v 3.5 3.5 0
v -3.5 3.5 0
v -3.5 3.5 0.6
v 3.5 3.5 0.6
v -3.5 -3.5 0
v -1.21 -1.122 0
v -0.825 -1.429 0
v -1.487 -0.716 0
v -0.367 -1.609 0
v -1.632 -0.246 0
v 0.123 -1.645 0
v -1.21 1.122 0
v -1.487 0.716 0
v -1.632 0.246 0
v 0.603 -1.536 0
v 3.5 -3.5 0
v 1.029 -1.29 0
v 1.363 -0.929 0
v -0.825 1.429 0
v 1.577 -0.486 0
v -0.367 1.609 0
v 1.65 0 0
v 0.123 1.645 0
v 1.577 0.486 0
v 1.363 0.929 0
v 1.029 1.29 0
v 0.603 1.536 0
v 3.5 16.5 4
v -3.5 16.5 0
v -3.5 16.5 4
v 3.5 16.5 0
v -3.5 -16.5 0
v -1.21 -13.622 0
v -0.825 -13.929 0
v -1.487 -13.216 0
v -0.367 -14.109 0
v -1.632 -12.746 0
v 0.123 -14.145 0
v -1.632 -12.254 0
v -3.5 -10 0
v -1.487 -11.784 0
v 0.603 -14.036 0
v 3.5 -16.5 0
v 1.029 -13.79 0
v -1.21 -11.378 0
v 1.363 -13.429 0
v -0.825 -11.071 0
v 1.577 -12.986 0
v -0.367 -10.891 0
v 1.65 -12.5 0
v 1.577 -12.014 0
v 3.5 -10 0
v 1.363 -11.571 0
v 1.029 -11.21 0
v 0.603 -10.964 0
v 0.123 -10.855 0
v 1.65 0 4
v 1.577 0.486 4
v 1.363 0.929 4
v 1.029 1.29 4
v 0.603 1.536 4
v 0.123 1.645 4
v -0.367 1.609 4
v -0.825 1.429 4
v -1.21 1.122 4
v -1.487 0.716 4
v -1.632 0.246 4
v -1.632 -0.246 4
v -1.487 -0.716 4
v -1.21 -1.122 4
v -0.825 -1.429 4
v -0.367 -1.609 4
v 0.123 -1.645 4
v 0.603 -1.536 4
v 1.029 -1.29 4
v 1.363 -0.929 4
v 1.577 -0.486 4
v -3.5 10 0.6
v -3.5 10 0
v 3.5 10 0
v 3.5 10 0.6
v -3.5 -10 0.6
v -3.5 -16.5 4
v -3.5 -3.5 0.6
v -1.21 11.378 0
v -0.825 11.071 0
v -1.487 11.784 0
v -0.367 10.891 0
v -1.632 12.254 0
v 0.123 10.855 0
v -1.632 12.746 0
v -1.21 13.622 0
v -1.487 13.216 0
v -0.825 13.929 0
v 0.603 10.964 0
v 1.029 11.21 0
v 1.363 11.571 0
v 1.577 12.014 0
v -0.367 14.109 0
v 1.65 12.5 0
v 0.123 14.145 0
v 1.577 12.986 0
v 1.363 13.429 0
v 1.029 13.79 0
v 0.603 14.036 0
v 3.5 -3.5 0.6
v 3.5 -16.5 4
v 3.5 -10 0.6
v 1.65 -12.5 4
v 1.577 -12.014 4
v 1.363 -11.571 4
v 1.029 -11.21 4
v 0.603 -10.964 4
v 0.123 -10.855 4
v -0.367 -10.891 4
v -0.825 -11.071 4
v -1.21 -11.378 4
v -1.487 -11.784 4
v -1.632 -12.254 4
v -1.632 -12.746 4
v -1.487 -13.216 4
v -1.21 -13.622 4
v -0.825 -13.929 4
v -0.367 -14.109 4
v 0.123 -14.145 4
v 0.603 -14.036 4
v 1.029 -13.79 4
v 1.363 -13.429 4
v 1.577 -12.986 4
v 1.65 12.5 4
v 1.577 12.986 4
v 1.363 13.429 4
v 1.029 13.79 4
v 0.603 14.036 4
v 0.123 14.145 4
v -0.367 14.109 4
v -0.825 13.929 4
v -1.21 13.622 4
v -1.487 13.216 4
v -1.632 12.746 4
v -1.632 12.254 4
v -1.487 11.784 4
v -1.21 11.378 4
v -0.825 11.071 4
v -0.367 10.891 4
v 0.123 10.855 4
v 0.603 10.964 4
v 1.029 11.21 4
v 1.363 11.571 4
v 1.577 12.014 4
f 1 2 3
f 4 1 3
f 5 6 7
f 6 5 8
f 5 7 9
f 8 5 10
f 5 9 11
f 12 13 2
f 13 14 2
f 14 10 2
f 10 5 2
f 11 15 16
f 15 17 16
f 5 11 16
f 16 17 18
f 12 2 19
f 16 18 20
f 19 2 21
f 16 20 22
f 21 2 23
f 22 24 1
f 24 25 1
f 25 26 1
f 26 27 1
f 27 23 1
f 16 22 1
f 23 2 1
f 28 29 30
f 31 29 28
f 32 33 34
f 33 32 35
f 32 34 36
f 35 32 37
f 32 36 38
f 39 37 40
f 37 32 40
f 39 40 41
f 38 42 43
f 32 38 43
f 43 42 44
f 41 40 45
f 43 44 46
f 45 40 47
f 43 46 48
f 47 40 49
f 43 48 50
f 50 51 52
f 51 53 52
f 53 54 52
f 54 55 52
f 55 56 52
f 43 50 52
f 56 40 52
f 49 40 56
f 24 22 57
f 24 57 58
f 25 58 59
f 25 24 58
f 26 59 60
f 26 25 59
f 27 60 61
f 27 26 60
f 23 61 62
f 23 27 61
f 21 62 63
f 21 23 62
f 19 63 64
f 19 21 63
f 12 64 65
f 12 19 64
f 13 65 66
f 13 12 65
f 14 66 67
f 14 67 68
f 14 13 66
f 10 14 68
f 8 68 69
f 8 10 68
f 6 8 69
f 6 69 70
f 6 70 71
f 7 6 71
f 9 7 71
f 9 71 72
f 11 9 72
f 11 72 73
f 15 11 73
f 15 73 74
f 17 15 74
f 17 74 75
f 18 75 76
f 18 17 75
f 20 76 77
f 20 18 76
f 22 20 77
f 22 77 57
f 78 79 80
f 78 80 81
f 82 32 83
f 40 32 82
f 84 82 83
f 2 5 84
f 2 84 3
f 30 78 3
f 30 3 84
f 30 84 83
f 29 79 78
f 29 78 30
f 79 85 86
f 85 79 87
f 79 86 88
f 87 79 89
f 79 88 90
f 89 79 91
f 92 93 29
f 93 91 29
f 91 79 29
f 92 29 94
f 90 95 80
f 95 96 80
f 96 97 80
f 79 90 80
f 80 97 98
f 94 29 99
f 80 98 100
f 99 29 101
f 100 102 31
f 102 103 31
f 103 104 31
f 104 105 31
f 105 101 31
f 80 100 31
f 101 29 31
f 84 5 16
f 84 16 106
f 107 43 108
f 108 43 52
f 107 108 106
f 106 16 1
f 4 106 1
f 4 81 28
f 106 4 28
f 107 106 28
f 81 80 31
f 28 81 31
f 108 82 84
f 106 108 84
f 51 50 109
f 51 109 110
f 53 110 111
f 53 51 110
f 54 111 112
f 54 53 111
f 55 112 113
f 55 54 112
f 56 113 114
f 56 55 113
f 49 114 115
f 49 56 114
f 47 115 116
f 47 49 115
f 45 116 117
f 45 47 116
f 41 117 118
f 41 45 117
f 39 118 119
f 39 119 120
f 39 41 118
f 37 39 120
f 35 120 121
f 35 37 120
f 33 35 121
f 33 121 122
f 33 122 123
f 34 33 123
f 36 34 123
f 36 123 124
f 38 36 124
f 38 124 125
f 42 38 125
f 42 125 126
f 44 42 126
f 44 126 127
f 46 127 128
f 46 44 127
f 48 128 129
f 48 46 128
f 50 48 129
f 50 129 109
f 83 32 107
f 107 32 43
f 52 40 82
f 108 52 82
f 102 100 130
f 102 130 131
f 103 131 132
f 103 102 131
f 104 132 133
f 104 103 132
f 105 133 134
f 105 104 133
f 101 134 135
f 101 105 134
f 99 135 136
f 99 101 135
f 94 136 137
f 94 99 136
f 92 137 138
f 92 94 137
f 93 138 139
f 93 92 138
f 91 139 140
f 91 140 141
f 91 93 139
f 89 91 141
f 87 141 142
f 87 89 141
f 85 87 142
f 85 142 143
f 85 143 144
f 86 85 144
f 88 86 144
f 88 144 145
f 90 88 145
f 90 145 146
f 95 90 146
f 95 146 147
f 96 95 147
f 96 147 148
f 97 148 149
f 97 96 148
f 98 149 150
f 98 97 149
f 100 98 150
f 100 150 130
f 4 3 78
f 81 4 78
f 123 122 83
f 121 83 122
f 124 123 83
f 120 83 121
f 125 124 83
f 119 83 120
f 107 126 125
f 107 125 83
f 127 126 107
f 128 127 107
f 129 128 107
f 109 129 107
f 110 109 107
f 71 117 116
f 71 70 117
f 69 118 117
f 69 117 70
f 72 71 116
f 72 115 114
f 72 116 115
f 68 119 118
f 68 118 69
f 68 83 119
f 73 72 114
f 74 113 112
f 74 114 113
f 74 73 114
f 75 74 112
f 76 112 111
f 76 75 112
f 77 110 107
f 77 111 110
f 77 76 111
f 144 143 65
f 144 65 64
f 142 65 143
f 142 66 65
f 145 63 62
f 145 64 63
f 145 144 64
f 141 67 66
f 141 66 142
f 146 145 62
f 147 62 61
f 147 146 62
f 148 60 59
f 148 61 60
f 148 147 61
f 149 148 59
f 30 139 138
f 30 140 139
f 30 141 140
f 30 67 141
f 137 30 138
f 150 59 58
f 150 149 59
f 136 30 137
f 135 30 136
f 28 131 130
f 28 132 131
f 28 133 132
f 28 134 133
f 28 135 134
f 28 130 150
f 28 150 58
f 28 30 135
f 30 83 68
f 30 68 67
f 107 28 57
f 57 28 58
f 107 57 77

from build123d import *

# Parameters (mm, degrees)
ESBO_O1_W                = 7
ESBO_O1_H                = 33
ESBO_O1_R                = 1.65
RESSALTO_EXTRUS_O1_DEPTH = 4
ESBO_O2_W                = 0.6
ESBO_O2_H                = 6.5
CORTE_EXTRUS_O1_DEPTH    = 8


with BuildPart() as part:
    # Esboço1 → Ressalto-extrusão1 (new body)
    with BuildSketch(Plane.XY):
        Rectangle(ESBO_O1_W, ESBO_O1_H)
        Circle(ESBO_O1_R, mode=Mode.SUBTRACT)
        with Locations((0, 12.5)):
            Circle(ESBO_O1_R, mode=Mode.SUBTRACT)
        with Locations((0, -12.5)):
            Circle(ESBO_O1_R, mode=Mode.SUBTRACT)
    extrude(amount=RESSALTO_EXTRUS_O1_DEPTH)

    # Esboço2 → Corte-extrusão1 (cut, through all)
    with BuildSketch(Plane.ZY.offset(3.5)):
        with Locations((0.3, 6.75)):
            Rectangle(ESBO_O2_W, ESBO_O2_H)
        with Locations((0.3, -6.75)):
            Rectangle(ESBO_O2_W, ESBO_O2_H)
    extrude(amount=-CORTE_EXTRUS_O1_DEPTH, mode=Mode.SUBTRACT)


solid = part.part
